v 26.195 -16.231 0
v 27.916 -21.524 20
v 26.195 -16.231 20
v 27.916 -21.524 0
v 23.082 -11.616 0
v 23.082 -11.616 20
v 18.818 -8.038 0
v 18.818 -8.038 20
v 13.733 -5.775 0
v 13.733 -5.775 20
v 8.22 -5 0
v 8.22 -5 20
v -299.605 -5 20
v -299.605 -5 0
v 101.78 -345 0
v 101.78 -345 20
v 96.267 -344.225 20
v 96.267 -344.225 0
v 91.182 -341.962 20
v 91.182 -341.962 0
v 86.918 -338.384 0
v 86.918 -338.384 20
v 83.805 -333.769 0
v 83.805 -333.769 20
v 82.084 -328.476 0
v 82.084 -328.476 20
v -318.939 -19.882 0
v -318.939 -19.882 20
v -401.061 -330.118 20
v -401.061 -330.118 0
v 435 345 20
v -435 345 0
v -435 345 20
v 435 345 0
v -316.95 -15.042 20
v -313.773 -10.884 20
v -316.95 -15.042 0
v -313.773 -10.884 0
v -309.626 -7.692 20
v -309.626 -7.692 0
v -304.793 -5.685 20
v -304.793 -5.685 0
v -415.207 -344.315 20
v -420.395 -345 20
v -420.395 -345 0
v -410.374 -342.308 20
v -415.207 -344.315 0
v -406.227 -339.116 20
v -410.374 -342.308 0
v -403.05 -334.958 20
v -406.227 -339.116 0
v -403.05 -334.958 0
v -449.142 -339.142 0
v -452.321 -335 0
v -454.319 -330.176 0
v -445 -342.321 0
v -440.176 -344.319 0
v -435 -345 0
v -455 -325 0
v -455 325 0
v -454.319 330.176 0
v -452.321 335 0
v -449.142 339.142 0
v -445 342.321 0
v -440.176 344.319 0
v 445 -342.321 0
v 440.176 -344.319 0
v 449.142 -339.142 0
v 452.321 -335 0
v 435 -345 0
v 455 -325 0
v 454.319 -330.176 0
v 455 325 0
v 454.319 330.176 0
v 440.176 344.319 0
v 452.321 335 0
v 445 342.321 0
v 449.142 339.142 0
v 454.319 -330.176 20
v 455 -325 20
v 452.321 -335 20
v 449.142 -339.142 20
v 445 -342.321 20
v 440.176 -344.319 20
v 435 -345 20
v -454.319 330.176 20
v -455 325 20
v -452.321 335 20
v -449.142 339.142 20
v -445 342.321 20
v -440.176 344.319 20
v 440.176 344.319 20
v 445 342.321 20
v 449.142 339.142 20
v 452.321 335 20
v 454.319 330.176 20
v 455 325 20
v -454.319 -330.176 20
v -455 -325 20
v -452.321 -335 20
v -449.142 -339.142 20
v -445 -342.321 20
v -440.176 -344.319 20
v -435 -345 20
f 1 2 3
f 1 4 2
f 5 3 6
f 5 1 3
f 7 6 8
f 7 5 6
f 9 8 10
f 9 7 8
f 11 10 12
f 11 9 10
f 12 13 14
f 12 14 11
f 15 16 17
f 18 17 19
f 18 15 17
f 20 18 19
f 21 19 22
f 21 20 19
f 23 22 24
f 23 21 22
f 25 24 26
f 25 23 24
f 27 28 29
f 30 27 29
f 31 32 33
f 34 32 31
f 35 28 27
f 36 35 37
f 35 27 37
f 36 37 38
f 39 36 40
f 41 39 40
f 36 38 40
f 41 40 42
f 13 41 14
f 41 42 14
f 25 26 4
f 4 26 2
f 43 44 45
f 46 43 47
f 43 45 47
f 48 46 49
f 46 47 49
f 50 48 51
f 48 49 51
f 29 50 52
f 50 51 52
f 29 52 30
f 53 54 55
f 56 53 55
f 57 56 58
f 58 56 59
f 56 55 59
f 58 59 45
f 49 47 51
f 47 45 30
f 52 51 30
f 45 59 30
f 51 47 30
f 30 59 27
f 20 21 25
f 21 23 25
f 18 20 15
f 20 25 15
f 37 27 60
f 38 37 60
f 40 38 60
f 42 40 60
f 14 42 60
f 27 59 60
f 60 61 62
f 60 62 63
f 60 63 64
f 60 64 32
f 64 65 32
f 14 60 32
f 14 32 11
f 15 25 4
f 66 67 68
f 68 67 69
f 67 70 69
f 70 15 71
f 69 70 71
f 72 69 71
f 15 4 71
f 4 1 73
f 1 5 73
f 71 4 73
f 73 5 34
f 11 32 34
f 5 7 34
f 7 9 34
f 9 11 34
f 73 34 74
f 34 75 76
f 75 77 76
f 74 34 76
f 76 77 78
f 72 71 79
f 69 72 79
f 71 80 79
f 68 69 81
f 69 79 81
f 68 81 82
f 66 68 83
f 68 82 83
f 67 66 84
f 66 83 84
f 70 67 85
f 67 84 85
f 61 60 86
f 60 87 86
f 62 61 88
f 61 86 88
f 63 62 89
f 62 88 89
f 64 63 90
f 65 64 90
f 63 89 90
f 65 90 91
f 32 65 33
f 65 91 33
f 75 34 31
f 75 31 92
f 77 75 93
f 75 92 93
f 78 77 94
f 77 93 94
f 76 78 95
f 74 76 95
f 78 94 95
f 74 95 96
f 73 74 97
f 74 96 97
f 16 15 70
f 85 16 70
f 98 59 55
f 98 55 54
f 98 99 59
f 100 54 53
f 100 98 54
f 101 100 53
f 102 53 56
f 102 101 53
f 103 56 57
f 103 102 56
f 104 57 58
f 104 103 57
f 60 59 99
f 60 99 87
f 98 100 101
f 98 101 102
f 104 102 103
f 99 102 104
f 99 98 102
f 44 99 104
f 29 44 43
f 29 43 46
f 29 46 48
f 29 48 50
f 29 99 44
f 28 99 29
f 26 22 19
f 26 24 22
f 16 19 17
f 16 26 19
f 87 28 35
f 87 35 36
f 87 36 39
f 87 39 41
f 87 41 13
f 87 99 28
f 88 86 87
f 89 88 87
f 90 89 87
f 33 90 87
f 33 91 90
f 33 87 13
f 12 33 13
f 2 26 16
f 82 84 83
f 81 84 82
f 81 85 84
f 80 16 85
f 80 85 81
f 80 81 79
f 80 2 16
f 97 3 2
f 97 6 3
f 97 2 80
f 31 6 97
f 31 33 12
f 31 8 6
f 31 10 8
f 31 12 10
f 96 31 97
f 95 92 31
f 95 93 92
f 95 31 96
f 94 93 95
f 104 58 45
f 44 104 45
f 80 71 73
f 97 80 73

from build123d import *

# Parameters (mm, degrees)
F0_W     = 910
F0_H     = 690
F1_DEPTH = 20
F2_W     = 340
F2_H     = 340
F3_DEPTH = 25
F4_R     = 20


with BuildPart() as f1:
    # F0 (on Top) → F1 (new body)
    with BuildSketch(Plane.XY):
        Rectangle(F0_W, F0_H)
    extrude(amount=F1_DEPTH)

    # F2 (on face) → F3 (cut)
    with BuildSketch(Plane.XY.offset(20)):
        with Locations((-145, -175)):
            Rectangle(F2_W, F2_H)
        Polygon((-405, -345), (-315, -345), (-315, -5), align=None)
        Polygon((25, -5), (25, -345), (85, -345), align=None)
    extrude(amount=-F3_DEPTH, mode=Mode.SUBTRACT)

    # F4
    f4_edges = [f1.edges().sort_by_distance(p)[0] for p in [
        (-315, -5, 10),
        (25, -5, 10),
        (455, -345, 10),
        (455, 345, 10),
        (-455, 345, 10),
        (-455, -345, 10),
        (-405, -345, 10),
        (85, -345, 10),
    ]]
    fillet(f4_edges, radius=F4_R)


solid = f1.part
